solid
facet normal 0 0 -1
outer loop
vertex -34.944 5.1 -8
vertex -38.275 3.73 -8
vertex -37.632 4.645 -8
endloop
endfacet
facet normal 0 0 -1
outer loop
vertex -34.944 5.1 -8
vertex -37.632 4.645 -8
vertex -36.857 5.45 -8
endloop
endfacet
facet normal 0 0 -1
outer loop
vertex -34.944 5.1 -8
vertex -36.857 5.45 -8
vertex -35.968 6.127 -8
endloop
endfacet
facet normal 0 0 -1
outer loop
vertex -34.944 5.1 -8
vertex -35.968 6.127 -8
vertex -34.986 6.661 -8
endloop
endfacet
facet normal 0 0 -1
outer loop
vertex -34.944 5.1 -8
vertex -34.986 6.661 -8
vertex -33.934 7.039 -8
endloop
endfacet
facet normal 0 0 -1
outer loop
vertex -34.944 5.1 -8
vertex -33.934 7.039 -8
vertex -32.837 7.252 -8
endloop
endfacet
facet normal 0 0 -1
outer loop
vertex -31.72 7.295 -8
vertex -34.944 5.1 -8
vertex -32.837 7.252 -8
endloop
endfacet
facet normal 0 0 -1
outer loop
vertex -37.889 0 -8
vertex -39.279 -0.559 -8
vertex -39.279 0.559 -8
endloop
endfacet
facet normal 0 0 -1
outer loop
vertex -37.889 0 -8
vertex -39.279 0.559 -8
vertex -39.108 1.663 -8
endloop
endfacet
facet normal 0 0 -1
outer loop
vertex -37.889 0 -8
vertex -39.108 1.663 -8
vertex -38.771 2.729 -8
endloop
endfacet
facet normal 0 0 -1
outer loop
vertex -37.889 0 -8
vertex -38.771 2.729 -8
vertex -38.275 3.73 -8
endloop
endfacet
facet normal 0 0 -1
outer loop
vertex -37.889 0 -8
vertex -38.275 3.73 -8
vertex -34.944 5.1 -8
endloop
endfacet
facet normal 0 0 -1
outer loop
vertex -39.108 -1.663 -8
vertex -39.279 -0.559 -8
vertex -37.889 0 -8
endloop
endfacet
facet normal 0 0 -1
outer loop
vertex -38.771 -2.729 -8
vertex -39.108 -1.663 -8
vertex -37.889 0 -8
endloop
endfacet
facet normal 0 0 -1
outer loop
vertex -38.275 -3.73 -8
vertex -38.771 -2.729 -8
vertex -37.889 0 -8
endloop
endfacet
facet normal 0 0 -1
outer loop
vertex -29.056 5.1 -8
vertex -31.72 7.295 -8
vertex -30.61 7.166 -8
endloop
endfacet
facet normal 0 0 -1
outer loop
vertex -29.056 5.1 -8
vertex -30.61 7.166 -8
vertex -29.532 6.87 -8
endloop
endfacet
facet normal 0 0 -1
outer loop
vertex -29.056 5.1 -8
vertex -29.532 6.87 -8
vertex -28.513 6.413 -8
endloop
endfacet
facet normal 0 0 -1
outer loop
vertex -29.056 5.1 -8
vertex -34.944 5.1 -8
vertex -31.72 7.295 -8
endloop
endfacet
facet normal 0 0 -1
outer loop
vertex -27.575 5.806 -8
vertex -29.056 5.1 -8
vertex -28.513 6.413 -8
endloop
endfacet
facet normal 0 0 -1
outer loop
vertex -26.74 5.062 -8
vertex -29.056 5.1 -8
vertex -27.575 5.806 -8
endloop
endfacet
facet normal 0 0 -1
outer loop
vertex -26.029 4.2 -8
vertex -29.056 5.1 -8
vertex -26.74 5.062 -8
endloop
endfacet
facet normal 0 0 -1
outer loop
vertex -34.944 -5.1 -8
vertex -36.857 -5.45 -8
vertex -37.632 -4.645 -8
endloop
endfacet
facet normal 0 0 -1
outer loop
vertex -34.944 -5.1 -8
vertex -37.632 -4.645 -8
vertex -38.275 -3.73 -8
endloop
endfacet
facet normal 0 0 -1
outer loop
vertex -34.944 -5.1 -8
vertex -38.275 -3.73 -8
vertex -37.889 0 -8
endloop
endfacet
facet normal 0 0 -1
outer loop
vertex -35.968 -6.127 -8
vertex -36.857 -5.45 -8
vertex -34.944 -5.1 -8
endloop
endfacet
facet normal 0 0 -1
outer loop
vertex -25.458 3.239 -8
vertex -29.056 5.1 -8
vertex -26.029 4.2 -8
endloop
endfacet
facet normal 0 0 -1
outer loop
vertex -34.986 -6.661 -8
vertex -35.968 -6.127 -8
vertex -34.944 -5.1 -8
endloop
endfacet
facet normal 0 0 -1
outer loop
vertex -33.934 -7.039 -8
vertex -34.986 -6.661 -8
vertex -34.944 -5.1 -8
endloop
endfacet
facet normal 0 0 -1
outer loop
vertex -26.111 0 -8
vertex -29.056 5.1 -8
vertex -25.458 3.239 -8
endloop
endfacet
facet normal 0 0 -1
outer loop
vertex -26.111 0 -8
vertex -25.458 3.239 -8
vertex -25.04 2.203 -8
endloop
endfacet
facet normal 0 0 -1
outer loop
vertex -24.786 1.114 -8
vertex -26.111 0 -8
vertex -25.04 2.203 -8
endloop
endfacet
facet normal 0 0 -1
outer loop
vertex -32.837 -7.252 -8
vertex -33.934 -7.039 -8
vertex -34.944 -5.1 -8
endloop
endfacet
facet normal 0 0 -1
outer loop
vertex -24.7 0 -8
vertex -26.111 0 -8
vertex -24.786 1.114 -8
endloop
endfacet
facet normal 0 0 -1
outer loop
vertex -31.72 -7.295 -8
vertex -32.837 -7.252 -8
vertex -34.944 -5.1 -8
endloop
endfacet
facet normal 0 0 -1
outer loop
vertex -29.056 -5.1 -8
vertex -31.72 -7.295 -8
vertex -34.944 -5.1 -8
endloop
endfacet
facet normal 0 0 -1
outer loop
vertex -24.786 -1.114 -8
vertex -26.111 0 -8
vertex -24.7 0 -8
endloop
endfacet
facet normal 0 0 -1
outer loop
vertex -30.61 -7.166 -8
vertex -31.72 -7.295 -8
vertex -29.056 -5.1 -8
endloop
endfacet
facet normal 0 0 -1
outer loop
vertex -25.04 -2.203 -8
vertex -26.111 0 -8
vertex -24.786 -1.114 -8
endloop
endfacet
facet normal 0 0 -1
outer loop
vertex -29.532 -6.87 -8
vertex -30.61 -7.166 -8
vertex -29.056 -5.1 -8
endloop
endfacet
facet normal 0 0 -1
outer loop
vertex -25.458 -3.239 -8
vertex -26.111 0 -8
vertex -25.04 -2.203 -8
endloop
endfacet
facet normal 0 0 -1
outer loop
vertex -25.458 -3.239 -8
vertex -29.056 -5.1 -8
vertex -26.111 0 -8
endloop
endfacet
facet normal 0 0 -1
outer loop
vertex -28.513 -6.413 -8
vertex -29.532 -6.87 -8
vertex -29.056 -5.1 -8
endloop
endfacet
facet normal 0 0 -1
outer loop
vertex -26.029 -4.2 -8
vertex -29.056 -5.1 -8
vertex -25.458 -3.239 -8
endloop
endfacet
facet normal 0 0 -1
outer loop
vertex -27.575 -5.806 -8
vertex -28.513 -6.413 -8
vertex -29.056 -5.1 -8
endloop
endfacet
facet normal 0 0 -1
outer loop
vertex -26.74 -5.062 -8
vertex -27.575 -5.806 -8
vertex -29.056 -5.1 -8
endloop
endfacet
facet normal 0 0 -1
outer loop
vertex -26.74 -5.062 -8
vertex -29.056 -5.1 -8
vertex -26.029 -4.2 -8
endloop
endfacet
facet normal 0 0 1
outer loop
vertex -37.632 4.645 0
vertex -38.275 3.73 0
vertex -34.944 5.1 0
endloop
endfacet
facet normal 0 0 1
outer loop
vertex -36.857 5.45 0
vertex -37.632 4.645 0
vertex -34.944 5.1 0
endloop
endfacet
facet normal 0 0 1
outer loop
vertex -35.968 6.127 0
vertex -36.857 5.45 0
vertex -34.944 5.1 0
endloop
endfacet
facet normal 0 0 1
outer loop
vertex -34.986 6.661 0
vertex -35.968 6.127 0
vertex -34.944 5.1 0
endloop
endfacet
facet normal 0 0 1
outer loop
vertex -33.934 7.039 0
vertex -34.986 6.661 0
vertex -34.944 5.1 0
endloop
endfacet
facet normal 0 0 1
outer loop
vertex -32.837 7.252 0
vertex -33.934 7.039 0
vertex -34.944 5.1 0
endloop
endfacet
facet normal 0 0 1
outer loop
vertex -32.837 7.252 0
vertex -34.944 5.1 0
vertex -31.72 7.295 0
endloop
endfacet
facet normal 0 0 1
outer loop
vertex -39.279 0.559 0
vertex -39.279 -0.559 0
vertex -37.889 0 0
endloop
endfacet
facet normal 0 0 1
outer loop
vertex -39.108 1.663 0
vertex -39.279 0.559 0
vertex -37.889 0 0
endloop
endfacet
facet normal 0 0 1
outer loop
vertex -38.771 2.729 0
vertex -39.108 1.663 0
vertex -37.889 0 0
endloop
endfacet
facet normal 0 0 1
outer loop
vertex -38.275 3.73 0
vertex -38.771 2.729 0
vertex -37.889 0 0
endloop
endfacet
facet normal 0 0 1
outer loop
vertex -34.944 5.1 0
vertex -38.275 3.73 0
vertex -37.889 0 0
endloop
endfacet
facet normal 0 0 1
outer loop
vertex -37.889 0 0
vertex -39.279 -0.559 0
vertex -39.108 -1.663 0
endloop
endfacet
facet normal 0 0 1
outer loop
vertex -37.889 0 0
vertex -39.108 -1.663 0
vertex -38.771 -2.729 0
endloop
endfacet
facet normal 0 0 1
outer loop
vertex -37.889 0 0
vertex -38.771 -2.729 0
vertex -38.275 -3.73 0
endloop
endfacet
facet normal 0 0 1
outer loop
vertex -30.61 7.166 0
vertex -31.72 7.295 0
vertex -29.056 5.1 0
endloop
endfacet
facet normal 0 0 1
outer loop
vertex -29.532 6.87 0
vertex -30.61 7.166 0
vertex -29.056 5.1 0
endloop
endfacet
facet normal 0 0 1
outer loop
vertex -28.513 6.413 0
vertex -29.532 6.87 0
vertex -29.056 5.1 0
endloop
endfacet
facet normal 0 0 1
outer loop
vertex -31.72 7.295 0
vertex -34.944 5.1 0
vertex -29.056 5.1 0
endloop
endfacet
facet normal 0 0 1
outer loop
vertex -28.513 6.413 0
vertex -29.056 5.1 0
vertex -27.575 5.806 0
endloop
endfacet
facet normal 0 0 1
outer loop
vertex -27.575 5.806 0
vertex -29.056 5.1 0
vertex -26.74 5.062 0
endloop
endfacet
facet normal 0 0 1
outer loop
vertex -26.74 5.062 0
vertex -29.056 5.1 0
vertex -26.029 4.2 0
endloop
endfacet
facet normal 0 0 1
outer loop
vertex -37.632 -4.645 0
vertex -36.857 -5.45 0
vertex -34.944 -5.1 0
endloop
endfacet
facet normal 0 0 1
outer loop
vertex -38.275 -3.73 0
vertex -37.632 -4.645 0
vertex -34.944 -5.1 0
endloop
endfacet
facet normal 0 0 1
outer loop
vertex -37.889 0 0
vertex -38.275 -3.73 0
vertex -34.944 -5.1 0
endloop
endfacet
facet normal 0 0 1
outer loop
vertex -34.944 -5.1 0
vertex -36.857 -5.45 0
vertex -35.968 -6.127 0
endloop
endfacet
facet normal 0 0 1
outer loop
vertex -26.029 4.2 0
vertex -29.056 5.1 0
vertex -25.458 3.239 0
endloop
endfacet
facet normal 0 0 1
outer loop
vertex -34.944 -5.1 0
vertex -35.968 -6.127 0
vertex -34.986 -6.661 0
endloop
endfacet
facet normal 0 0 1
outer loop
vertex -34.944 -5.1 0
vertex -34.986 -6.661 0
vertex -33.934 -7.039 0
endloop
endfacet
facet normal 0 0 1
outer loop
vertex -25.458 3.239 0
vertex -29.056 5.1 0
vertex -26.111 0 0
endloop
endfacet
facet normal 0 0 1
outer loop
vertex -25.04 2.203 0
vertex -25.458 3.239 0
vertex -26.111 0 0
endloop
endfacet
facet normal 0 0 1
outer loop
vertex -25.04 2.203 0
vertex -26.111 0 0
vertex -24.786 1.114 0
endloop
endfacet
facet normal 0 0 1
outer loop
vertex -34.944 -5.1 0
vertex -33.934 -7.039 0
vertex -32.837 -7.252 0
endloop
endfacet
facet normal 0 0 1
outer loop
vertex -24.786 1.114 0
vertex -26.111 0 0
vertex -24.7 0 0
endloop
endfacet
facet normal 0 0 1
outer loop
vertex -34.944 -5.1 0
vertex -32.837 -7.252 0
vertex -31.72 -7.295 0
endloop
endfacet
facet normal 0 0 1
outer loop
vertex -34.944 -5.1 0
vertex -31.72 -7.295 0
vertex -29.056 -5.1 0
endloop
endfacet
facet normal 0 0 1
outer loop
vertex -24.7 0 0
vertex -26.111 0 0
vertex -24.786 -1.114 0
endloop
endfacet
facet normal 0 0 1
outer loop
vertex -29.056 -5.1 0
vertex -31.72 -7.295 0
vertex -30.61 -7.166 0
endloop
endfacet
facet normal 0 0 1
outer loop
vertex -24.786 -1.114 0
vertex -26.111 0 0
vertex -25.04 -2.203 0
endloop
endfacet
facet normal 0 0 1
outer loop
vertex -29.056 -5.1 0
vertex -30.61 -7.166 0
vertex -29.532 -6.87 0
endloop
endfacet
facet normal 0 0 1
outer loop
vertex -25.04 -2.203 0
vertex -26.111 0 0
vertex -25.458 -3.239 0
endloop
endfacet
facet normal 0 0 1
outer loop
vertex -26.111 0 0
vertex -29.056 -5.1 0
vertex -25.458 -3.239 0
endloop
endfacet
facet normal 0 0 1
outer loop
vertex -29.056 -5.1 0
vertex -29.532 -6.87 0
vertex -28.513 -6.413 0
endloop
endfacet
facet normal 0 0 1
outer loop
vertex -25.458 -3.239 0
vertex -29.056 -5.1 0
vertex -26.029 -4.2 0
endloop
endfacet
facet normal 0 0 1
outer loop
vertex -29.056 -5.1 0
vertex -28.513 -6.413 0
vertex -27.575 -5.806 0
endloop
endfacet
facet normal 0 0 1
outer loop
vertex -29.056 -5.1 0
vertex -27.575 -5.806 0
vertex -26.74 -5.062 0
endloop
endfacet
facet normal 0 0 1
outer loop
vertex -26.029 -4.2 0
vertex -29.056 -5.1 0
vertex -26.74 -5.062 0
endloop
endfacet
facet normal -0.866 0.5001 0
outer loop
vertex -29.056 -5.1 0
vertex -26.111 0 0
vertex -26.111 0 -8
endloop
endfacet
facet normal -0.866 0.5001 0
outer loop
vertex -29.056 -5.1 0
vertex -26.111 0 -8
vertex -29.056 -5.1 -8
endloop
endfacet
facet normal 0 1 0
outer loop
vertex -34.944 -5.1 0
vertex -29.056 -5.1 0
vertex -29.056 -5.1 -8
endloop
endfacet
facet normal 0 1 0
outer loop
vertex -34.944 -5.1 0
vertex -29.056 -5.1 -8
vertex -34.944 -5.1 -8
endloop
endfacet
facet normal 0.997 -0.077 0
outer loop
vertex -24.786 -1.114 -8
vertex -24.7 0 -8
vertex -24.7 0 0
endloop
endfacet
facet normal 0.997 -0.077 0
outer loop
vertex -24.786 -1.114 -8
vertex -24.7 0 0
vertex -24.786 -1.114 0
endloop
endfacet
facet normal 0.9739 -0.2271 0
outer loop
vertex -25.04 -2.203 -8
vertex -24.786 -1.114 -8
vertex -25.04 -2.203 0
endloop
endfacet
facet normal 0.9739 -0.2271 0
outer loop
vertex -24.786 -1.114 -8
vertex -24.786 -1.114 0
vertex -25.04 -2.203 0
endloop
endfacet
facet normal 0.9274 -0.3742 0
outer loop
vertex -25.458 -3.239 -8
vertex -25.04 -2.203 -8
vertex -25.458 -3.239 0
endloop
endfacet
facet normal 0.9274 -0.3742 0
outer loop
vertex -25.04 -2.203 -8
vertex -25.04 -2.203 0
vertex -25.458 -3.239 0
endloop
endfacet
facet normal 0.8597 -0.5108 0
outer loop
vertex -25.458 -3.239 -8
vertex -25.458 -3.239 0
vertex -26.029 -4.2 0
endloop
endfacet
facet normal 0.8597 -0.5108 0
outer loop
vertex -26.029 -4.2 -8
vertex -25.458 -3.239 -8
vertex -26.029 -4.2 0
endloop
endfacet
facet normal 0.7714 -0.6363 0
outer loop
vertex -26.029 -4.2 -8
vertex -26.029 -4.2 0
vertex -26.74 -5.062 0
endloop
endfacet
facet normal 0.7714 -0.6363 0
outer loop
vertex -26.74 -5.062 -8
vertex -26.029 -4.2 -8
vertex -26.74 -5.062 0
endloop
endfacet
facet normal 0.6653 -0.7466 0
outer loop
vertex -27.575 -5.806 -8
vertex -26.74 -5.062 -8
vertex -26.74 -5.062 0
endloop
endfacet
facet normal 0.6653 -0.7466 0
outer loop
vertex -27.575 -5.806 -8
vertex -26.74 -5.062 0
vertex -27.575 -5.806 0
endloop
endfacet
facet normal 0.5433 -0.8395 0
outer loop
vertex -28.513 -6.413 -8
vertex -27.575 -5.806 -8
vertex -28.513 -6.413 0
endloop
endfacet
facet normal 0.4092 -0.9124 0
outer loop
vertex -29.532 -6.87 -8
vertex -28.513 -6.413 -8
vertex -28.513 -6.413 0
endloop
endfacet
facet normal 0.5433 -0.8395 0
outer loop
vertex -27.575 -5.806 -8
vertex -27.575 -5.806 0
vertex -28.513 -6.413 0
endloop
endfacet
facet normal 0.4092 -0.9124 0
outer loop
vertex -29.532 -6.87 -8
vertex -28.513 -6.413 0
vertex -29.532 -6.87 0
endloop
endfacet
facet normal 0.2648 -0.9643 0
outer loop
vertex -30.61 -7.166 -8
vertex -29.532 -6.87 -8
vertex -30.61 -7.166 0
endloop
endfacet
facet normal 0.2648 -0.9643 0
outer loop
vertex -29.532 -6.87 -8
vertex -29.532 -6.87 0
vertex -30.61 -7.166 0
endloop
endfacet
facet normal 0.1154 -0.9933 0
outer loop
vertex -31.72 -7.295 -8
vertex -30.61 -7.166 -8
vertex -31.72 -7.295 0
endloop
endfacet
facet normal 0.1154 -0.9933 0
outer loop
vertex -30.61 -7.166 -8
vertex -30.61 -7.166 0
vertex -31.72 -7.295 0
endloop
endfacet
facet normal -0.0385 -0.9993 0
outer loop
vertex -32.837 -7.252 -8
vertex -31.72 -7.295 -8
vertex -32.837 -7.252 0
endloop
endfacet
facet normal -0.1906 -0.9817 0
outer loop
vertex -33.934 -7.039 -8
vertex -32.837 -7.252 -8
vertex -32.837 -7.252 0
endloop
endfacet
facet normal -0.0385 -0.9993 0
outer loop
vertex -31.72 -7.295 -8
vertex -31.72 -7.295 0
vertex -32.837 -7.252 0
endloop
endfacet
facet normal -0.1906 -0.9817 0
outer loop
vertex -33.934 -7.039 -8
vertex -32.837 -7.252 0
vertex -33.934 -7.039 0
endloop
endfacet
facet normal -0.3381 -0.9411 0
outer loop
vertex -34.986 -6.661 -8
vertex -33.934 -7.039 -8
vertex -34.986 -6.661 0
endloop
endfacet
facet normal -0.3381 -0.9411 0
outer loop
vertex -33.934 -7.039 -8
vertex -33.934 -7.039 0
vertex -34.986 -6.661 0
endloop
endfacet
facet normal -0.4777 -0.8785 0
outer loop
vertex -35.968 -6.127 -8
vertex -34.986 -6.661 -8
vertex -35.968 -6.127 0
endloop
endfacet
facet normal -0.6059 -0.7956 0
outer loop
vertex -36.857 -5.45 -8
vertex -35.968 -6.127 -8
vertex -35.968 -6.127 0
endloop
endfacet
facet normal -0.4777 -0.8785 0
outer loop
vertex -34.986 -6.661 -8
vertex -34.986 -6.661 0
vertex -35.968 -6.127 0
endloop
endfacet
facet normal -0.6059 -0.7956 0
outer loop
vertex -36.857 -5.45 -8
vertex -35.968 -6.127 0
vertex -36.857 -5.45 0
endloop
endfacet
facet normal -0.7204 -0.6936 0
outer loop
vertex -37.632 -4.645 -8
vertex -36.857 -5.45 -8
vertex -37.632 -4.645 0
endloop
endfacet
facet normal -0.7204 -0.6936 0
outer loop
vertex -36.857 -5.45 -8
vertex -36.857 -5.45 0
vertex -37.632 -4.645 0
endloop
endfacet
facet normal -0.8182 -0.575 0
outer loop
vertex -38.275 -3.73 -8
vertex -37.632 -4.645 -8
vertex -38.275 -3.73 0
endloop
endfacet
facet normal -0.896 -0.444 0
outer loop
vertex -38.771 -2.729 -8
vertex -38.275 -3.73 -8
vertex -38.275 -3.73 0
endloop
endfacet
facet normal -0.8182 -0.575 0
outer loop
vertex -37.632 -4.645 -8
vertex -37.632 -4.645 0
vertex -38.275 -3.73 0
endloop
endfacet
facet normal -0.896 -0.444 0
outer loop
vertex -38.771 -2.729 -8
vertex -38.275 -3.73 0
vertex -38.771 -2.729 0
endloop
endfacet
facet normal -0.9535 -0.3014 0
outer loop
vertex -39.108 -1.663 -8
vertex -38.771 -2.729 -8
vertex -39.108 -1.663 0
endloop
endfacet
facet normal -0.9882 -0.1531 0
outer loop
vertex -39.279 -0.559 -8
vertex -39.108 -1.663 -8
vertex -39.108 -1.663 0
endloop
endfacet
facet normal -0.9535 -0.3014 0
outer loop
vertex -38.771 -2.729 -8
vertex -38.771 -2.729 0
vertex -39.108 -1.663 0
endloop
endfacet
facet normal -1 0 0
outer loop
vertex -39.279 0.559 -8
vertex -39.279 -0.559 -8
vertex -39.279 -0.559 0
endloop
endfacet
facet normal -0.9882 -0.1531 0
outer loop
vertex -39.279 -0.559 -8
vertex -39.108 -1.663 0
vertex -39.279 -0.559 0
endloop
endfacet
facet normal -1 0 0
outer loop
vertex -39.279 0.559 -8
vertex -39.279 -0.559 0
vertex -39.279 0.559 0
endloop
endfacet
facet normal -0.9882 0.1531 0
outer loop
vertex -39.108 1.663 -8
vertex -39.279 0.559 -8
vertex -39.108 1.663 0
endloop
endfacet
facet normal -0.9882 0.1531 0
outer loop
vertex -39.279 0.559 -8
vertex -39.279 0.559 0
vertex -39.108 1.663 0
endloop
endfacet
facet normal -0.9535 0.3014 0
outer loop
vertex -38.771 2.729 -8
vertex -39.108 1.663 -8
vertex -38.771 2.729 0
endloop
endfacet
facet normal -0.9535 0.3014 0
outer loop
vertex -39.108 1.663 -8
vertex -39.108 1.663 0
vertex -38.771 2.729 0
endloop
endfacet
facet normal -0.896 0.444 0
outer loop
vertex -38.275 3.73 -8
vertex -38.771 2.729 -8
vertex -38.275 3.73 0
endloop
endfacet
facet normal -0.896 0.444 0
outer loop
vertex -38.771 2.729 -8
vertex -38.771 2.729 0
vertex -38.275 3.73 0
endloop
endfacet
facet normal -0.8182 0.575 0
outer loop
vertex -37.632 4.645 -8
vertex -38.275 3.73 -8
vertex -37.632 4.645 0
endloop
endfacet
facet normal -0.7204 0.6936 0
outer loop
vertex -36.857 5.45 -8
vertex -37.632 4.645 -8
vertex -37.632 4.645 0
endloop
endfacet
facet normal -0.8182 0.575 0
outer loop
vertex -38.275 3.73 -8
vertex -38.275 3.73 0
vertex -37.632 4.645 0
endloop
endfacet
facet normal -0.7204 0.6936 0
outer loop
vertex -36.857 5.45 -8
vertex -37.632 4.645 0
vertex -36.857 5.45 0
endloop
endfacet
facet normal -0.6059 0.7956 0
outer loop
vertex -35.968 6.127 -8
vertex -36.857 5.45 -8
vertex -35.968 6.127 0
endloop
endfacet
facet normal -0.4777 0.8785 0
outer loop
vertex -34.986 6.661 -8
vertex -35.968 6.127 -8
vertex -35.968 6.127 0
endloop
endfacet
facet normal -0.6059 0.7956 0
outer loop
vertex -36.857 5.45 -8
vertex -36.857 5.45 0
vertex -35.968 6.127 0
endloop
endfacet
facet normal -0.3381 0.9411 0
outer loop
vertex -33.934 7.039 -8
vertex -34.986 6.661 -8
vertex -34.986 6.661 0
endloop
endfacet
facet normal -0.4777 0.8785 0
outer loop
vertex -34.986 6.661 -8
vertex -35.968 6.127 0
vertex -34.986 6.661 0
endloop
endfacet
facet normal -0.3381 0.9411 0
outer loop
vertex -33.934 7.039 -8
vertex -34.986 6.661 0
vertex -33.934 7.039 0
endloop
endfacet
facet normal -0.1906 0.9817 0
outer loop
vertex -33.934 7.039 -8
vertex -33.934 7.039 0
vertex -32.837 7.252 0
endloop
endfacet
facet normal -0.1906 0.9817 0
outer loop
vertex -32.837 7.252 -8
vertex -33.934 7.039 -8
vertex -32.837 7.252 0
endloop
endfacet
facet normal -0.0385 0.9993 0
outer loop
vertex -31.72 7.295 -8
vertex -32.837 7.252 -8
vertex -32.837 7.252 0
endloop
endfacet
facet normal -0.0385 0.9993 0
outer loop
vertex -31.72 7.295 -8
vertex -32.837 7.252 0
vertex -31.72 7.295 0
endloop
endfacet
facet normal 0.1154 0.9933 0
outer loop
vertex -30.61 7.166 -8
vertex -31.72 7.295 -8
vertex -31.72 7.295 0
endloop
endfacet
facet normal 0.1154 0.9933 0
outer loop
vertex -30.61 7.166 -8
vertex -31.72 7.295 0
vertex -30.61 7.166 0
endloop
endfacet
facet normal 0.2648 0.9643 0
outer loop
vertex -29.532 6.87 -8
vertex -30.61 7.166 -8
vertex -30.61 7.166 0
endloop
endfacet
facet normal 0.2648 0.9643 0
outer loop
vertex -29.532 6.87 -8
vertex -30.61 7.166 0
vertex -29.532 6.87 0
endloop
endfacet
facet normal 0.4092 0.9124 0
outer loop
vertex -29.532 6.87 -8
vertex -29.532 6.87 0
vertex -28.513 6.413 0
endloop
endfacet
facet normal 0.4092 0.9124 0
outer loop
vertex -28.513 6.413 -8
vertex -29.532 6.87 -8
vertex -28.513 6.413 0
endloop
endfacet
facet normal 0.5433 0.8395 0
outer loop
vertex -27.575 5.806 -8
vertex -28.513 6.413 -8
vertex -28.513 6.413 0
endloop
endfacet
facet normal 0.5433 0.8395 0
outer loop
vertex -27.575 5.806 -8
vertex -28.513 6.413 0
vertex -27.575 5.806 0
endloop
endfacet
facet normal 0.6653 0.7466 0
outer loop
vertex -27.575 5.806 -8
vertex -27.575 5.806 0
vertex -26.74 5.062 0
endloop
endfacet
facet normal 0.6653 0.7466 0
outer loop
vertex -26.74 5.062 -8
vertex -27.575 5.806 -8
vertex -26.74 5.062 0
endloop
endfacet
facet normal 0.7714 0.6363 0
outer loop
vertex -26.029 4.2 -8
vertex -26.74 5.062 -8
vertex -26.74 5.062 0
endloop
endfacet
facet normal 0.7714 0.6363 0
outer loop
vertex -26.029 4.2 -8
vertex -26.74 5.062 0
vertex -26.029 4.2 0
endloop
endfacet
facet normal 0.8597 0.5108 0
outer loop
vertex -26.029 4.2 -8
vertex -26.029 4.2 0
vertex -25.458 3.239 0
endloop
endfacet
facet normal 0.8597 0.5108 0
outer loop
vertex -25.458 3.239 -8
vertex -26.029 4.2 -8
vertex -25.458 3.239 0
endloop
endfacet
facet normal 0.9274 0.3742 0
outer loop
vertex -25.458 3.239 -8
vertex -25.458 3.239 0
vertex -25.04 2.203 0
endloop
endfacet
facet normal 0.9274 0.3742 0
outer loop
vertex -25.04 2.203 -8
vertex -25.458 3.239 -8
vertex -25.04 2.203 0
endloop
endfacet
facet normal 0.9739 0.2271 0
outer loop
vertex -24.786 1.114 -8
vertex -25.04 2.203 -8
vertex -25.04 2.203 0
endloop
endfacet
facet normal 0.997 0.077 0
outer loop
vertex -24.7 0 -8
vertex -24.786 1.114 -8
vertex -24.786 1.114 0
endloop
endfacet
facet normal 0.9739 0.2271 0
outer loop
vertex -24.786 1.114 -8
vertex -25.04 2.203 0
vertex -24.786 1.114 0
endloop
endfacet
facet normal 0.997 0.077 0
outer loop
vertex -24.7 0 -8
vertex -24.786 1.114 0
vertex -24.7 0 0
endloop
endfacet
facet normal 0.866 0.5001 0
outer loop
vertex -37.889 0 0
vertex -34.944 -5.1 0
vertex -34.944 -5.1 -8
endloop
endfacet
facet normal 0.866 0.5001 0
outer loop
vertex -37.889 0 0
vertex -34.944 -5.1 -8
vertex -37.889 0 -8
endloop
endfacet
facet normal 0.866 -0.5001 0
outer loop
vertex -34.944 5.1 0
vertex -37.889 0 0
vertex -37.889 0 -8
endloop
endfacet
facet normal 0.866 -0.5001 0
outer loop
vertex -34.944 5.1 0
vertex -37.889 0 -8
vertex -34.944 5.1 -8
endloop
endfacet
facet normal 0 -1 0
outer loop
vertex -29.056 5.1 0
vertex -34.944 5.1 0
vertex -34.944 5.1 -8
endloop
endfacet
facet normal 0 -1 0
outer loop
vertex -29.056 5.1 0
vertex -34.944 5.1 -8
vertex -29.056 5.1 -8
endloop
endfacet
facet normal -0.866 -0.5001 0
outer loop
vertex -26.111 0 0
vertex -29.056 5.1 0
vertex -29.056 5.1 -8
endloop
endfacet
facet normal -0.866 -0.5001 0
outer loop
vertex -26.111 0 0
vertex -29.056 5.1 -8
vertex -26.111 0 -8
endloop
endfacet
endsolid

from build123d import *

# Parameters (mm, degrees)
SKETCH002_R = 7.3
PAD_DEPTH   = 8


with BuildPart() as part:
    # Sketch002 → Pad (new body)
    with BuildSketch(Plane(origin=(0, 0, 0), x_dir=(1, 0, 0), z_dir=(0, 0, -1))):
        with Locations((-32, 0)):
            Circle(SKETCH002_R)
        Polygon((-34.944486, 5.1), (-37.888973, 0), (-34.944486, -5.1), (-29.055514, -5.1), (-26.111027, 0), (-29.055514, 5.1), align=None, mode=Mode.SUBTRACT)
    extrude(amount=PAD_DEPTH)


solid = part.part
